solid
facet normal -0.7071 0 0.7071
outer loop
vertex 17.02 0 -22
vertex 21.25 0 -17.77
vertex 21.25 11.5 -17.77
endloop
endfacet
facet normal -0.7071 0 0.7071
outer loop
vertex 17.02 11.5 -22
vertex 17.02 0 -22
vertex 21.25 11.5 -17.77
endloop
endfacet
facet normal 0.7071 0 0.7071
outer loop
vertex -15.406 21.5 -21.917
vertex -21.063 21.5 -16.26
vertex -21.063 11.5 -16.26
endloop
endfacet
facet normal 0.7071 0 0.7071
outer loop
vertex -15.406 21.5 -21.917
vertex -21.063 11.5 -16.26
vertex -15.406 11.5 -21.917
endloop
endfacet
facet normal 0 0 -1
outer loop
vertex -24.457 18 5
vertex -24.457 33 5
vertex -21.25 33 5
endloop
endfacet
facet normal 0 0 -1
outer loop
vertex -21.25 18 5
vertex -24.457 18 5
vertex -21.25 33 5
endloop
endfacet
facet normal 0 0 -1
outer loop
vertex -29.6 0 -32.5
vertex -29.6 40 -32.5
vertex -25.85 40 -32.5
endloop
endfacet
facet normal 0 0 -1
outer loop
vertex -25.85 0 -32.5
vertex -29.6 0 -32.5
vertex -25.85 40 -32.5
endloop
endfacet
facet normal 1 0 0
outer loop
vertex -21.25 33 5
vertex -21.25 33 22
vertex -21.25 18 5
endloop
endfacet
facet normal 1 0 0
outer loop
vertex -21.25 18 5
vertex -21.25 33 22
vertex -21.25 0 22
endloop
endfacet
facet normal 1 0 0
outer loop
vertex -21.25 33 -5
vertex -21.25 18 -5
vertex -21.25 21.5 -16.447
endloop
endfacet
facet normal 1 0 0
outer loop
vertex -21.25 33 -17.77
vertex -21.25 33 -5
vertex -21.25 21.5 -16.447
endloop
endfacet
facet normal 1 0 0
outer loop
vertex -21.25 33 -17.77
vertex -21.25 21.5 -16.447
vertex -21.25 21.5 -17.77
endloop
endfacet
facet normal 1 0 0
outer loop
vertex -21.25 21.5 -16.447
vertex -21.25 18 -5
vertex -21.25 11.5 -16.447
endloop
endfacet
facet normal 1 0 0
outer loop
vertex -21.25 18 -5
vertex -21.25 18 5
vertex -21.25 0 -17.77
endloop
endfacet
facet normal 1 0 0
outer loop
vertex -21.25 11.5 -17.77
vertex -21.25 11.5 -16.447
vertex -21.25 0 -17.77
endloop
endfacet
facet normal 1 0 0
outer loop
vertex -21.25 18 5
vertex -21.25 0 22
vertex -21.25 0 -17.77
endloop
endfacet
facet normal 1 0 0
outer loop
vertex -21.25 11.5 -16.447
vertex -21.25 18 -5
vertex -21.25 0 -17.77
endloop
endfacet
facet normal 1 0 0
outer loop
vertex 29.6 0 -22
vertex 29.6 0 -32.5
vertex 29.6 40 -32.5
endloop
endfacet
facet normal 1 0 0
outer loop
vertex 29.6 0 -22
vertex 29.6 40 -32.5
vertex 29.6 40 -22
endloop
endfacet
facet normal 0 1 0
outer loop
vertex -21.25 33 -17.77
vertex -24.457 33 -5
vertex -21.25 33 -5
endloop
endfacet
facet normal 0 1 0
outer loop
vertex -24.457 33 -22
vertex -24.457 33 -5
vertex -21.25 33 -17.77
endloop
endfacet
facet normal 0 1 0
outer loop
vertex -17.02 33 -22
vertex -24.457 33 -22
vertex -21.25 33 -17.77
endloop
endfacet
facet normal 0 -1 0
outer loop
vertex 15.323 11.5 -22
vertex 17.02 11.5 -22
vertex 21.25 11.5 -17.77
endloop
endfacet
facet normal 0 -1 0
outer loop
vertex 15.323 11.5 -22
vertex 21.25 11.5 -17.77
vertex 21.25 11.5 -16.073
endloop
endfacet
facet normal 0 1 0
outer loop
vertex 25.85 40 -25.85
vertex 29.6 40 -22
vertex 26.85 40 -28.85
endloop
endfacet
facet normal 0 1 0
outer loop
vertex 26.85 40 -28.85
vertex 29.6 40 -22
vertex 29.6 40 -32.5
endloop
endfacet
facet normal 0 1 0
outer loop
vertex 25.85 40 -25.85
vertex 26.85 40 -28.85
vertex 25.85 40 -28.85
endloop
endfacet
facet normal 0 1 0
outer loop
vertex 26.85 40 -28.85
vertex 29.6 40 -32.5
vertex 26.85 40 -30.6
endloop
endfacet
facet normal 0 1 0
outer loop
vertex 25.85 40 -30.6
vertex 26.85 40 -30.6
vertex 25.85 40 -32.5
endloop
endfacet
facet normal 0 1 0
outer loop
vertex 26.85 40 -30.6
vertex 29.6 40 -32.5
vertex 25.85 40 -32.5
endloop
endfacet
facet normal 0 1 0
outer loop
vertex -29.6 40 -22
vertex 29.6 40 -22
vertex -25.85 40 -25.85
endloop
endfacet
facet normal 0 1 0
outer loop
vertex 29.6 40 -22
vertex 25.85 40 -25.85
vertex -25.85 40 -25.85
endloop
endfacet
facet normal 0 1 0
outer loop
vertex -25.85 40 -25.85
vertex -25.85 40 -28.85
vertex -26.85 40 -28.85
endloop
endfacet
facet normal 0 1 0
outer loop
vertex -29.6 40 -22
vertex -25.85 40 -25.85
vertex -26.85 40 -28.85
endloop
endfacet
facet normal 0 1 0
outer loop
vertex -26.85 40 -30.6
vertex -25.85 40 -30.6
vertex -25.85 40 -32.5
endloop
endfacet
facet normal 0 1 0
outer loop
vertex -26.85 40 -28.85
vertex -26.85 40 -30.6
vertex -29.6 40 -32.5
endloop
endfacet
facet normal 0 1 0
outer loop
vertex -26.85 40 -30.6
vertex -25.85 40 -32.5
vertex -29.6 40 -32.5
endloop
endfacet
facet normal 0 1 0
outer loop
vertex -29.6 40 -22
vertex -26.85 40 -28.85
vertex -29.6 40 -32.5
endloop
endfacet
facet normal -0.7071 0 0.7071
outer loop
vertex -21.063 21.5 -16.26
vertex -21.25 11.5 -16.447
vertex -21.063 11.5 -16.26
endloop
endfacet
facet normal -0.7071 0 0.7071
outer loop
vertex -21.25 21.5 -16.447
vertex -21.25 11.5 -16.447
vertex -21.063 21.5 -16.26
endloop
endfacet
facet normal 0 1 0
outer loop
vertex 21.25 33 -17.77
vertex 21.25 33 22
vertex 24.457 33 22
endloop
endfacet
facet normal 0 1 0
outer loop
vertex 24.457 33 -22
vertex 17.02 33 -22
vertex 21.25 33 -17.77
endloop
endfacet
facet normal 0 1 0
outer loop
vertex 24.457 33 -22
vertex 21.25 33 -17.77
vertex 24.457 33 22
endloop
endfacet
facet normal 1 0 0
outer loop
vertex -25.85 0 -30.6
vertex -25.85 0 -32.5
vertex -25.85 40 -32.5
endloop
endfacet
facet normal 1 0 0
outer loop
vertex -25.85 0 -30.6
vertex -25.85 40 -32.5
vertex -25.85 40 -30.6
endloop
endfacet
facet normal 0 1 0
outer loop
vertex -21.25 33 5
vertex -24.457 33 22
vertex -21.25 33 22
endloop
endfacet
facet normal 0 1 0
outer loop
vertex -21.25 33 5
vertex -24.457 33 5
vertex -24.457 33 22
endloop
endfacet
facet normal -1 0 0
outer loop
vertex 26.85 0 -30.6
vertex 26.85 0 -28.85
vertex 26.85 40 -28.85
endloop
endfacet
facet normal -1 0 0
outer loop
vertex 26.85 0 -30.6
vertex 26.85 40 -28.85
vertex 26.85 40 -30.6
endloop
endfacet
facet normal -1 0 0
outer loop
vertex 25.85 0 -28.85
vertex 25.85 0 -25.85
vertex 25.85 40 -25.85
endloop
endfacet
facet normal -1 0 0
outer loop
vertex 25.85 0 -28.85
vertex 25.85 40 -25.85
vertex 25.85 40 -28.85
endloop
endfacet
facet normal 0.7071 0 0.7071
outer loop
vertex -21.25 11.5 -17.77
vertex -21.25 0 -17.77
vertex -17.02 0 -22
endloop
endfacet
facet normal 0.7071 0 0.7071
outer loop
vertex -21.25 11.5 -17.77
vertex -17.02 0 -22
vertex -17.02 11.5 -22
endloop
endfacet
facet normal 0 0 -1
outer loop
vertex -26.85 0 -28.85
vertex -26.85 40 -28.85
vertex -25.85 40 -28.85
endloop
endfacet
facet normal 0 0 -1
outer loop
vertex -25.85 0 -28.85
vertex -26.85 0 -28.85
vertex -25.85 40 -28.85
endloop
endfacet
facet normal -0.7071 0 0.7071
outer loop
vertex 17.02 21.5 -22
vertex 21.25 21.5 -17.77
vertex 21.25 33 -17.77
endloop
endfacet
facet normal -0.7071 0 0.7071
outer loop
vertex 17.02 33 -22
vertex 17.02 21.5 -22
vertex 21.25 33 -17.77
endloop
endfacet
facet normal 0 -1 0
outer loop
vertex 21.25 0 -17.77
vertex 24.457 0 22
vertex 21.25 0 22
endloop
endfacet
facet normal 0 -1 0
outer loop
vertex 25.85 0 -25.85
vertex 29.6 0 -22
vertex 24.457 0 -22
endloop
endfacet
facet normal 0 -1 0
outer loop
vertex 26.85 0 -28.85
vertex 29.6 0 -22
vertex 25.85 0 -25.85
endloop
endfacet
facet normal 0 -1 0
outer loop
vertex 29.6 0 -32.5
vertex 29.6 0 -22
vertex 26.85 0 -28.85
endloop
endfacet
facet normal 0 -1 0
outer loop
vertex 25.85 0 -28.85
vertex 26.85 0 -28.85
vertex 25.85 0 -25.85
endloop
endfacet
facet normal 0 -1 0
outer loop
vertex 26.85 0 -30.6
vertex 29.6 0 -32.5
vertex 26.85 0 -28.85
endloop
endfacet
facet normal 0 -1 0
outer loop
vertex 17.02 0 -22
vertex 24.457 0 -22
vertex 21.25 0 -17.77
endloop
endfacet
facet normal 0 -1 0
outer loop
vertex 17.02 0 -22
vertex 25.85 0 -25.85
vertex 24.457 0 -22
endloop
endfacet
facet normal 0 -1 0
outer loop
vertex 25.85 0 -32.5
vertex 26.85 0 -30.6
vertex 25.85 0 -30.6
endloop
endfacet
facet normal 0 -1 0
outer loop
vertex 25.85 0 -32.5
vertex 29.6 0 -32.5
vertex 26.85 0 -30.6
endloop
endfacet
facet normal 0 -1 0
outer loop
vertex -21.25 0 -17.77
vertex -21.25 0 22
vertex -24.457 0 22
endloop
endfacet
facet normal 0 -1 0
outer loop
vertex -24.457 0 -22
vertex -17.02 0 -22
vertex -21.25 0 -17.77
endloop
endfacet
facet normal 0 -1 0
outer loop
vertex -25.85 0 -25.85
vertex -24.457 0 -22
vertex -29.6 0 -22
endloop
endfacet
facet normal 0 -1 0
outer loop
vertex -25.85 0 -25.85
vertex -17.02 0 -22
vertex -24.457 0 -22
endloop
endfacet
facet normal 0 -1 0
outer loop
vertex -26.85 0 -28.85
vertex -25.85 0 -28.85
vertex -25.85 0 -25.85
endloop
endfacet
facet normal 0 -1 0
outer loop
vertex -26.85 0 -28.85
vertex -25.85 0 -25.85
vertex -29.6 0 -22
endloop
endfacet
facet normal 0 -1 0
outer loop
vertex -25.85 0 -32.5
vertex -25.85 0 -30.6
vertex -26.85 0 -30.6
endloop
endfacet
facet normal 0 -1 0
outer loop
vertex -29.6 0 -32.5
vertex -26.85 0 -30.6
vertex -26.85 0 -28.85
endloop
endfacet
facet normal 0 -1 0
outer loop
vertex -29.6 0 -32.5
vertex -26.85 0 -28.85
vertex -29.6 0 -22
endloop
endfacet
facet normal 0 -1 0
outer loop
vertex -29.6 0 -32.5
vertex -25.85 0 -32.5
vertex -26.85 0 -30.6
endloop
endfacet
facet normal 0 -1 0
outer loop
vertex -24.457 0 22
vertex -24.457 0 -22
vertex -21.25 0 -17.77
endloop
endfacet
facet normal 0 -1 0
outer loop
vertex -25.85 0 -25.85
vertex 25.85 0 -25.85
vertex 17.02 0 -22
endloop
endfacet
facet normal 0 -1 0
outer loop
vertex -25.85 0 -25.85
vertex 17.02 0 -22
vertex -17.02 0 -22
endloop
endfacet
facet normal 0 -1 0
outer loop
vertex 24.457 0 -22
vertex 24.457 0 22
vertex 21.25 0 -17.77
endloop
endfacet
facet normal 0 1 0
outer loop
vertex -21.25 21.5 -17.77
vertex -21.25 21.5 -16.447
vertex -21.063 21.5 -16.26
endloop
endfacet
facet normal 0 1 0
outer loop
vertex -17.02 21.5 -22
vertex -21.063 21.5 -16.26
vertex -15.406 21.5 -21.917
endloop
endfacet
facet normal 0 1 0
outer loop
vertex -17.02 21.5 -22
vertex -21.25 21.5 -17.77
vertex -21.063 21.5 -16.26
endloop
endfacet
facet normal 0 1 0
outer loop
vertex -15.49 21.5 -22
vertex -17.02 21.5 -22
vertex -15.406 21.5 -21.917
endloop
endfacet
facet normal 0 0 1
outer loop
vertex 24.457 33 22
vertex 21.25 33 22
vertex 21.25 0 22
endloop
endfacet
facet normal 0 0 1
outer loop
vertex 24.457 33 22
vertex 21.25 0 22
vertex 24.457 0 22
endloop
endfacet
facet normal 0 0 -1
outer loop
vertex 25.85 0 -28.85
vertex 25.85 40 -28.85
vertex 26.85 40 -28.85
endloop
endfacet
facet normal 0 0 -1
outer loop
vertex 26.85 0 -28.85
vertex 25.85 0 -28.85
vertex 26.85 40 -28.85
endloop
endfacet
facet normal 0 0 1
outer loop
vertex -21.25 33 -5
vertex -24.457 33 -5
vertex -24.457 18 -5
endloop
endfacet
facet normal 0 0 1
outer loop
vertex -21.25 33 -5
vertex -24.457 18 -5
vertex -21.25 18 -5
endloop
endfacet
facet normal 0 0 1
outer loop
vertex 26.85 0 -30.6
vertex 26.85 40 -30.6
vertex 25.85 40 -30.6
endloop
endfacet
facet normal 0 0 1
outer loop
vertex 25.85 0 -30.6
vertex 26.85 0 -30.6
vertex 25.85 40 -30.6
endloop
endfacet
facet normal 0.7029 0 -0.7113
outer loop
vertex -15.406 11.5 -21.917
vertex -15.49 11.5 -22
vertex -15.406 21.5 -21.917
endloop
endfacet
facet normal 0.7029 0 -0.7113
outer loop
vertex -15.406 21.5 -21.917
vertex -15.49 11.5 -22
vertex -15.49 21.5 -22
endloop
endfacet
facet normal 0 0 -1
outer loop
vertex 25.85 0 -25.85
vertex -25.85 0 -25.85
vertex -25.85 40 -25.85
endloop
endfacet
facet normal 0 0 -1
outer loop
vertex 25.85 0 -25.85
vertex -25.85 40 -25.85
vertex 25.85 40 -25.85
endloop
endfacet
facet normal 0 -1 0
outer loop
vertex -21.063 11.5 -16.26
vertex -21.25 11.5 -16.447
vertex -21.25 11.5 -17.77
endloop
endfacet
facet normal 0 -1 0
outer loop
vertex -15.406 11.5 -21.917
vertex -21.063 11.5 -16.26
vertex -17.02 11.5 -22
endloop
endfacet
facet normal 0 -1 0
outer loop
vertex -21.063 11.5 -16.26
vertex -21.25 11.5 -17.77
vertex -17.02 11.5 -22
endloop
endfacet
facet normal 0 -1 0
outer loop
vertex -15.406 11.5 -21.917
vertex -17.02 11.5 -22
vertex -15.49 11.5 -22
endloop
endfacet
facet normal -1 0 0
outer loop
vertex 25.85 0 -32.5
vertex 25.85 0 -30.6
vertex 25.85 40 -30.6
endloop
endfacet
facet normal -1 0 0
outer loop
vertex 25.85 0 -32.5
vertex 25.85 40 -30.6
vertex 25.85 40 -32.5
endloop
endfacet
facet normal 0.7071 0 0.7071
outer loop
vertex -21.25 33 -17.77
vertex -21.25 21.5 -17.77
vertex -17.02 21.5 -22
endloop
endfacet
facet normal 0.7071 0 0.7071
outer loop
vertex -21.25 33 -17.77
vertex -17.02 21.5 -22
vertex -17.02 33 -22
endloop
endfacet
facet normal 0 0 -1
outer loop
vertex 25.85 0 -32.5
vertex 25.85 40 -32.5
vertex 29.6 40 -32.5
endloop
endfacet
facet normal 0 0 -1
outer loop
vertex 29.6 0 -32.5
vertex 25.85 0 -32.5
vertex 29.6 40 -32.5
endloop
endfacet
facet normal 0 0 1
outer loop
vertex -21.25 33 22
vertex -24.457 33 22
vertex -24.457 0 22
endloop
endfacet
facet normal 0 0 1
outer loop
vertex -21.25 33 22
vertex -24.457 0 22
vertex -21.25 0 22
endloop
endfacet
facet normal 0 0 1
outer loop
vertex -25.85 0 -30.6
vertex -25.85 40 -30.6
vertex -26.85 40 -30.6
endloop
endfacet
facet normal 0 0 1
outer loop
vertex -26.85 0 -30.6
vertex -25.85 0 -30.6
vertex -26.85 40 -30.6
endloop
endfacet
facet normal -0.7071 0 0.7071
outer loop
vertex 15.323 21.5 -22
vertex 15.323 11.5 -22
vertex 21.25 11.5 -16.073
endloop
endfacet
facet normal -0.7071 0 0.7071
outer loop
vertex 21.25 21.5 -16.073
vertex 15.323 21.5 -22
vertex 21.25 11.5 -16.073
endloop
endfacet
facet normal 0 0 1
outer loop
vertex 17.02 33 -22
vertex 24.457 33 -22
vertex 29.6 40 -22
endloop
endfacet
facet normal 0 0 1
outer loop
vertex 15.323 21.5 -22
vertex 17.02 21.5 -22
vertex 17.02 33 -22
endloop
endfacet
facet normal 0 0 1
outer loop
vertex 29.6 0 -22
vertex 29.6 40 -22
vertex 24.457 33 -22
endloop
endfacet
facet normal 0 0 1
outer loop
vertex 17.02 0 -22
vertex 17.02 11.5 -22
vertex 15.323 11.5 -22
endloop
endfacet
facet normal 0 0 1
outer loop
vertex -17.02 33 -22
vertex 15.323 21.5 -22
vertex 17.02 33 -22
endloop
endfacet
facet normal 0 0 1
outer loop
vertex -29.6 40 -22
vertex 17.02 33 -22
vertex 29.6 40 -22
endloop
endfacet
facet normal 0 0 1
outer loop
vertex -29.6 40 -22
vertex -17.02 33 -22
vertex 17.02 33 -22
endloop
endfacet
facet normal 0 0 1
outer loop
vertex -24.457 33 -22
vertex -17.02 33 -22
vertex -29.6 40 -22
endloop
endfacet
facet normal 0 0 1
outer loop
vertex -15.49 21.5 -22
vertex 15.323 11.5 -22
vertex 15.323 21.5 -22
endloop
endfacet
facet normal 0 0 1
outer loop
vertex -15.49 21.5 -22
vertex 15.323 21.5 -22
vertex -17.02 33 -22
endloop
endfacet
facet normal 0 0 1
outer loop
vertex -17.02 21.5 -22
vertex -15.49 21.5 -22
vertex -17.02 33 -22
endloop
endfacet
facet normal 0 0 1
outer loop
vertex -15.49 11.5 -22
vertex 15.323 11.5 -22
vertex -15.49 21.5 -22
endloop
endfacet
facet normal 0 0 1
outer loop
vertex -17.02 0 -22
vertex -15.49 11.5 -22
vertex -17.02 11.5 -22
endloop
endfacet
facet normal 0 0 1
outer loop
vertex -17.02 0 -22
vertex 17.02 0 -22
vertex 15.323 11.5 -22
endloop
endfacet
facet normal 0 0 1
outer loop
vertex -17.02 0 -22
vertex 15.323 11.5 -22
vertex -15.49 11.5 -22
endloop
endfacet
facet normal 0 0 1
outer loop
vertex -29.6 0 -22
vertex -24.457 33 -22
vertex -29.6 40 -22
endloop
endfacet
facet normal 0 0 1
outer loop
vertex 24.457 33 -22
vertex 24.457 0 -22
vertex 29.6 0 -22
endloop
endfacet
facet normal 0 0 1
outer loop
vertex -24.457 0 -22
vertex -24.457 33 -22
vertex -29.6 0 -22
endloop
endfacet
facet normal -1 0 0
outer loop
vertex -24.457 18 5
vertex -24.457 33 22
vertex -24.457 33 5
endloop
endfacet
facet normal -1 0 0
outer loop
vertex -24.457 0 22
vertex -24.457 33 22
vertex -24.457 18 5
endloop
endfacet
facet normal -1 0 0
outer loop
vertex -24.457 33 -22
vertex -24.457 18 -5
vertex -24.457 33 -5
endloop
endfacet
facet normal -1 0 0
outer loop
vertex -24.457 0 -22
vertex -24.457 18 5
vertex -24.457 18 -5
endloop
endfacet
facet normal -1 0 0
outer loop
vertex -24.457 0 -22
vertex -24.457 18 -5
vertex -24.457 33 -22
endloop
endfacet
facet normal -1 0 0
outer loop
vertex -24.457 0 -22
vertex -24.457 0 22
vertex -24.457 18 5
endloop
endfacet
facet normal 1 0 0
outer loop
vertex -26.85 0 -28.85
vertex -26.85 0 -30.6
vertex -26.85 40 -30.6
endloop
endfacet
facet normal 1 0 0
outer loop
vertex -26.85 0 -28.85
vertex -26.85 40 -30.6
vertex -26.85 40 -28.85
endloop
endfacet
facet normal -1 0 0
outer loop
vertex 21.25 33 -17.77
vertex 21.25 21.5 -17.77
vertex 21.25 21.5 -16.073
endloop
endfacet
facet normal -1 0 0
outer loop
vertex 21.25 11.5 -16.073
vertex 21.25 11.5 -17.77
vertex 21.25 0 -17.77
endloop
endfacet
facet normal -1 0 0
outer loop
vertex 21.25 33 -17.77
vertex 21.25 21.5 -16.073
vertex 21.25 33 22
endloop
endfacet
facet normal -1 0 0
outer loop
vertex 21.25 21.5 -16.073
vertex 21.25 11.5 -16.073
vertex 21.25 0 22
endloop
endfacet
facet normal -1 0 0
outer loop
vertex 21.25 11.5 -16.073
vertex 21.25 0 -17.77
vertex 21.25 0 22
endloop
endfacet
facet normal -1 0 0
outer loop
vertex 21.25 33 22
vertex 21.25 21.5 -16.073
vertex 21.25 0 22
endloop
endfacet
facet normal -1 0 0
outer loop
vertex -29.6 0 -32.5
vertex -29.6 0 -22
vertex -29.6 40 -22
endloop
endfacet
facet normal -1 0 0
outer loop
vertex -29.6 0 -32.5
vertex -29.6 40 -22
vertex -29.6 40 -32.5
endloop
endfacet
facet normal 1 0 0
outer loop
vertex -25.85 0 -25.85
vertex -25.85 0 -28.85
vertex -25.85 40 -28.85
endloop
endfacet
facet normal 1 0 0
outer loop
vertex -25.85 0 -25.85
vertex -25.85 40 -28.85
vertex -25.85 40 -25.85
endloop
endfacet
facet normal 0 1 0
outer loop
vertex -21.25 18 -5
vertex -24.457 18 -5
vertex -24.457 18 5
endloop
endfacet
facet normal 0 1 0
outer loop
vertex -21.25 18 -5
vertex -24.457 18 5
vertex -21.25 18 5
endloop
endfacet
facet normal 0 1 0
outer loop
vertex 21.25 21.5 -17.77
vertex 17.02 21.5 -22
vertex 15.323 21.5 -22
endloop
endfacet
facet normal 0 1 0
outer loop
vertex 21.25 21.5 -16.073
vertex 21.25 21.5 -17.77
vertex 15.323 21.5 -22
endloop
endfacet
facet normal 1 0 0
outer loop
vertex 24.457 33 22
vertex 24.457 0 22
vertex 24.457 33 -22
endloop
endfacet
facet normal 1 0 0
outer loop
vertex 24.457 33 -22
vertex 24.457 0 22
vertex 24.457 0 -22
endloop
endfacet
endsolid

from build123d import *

# Parameters (mm, degrees)
SKETCH1_W             = 3.207256709
SKETCH1_H             = 44
BOSS_EXTRUDE2_DEPTH   = 33
BOSS_EXTRUDE2_2_DEPTH = 33
BOSS_EXTRUDE3_DEPTH   = 40
CHAMFER4_SIZE         = 4.23
SKETCH2_W             = 8
SKETCH2_H             = 10
BOSS_EXTRUDE4_DEPTH   = 1.2
SKETCH3_W             = 10
SKETCH3_H             = 10
BOSS_EXTRUDE5_DEPTH   = 1.2
SKETCH4_W             = 3.207256709
SKETCH4_H             = 10
CUT_EXTRUDE1_DEPTH    = 15


with BuildPart() as part:
    # Sketch1 → Boss-Extrude2 (new body)
    with BuildSketch(Plane(origin=(0, 0, 0), x_dir=(1, 0, 0), z_dir=(0, 1, 0))):
        with Locations((-22.853628355, 0)):
            Rectangle(SKETCH1_W, SKETCH1_H)
    extrude(amount=BOSS_EXTRUDE2_DEPTH)



with BuildPart() as body_2:
    # Sketch1 → Boss-Extrude2 2 (new body)
    with BuildSketch(Plane(origin=(0, 0, 0), x_dir=(1, 0, 0), z_dir=(0, 1, 0))):
        with Locations((22.853628355, 0)):
            Rectangle(SKETCH1_W, SKETCH1_H)
    extrude(amount=BOSS_EXTRUDE2_2_DEPTH)


with BuildPart() as part_1:
    add(part.part)

    add(body_2.part)  # Boss-Extrude3 merges body 2
    # Sketch1<6> → Boss-Extrude3 (add)
    with BuildSketch(Plane(origin=(0, 0, 0), x_dir=(1, 0, 0), z_dir=(0, 1, 0))):
        Polygon((-25.85, 28.85), (-26.85, 28.85), (-26.85, 30.6), (-25.85, 30.6), (-25.85, 32.5), (-29.6, 32.5), (-29.6, 22), (-24.457256709, 22), (-21.25, 22), (21.25, 22), (23.75, 22), (24.457256709, 22), (29.6, 22), (29.6, 32.5), (25.85, 32.5), (25.85, 30.6), (26.85, 30.6), (26.85, 28.85), (25.85, 28.85), (25.85, 25.85), (-25.85, 25.85), align=None)
    extrude(amount=BOSS_EXTRUDE3_DEPTH)

    # Chamfer4
    chamfer4_edges = [part_1.edges().sort_by_distance(p)[0] for p in [
        (21.25, 16.5, -22),
        (-21.25, 16.5, -22),
    ]]
    chamfer(chamfer4_edges, length=CHAMFER4_SIZE)

    # Sketch2 → Boss-Extrude4 (add)
    with BuildSketch(Plane(origin=(-19.51, 0, -19.51), x_dir=(0.7071067811865509, 0, -0.7071067811865442), z_dir=(0.7071067811865442, 0, 0.7071067811865509))):
        with Locations((0.603606398, 16.5)):
            Rectangle(SKETCH2_W, SKETCH2_H)
    extrude(amount=BOSS_EXTRUDE4_DEPTH)

    # Sketch3 → Boss-Extrude5 (add)
    with BuildSketch(Plane(origin=(19.51, 0, -19.51), x_dir=(0.7071067811865442, 0, 0.7071067811865509), z_dir=(-0.7071067811865509, 0, 0.7071067811865442))):
        with Locations((-0.530330086, 16.5)):
            Rectangle(SKETCH3_W, SKETCH3_H)
    extrude(amount=BOSS_EXTRUDE5_DEPTH)

    # Sketch4 → Cut-Extrude1 (cut)
    with BuildSketch(Plane(origin=(0, 33, 0), x_dir=(1, 0, 0), z_dir=(0, 1, 0))):
        with Locations((-22.853628355, 0)):
            Rectangle(SKETCH4_W, SKETCH4_H)
    extrude(amount=-CUT_EXTRUDE1_DEPTH, mode=Mode.SUBTRACT)


solid = part_1.part
